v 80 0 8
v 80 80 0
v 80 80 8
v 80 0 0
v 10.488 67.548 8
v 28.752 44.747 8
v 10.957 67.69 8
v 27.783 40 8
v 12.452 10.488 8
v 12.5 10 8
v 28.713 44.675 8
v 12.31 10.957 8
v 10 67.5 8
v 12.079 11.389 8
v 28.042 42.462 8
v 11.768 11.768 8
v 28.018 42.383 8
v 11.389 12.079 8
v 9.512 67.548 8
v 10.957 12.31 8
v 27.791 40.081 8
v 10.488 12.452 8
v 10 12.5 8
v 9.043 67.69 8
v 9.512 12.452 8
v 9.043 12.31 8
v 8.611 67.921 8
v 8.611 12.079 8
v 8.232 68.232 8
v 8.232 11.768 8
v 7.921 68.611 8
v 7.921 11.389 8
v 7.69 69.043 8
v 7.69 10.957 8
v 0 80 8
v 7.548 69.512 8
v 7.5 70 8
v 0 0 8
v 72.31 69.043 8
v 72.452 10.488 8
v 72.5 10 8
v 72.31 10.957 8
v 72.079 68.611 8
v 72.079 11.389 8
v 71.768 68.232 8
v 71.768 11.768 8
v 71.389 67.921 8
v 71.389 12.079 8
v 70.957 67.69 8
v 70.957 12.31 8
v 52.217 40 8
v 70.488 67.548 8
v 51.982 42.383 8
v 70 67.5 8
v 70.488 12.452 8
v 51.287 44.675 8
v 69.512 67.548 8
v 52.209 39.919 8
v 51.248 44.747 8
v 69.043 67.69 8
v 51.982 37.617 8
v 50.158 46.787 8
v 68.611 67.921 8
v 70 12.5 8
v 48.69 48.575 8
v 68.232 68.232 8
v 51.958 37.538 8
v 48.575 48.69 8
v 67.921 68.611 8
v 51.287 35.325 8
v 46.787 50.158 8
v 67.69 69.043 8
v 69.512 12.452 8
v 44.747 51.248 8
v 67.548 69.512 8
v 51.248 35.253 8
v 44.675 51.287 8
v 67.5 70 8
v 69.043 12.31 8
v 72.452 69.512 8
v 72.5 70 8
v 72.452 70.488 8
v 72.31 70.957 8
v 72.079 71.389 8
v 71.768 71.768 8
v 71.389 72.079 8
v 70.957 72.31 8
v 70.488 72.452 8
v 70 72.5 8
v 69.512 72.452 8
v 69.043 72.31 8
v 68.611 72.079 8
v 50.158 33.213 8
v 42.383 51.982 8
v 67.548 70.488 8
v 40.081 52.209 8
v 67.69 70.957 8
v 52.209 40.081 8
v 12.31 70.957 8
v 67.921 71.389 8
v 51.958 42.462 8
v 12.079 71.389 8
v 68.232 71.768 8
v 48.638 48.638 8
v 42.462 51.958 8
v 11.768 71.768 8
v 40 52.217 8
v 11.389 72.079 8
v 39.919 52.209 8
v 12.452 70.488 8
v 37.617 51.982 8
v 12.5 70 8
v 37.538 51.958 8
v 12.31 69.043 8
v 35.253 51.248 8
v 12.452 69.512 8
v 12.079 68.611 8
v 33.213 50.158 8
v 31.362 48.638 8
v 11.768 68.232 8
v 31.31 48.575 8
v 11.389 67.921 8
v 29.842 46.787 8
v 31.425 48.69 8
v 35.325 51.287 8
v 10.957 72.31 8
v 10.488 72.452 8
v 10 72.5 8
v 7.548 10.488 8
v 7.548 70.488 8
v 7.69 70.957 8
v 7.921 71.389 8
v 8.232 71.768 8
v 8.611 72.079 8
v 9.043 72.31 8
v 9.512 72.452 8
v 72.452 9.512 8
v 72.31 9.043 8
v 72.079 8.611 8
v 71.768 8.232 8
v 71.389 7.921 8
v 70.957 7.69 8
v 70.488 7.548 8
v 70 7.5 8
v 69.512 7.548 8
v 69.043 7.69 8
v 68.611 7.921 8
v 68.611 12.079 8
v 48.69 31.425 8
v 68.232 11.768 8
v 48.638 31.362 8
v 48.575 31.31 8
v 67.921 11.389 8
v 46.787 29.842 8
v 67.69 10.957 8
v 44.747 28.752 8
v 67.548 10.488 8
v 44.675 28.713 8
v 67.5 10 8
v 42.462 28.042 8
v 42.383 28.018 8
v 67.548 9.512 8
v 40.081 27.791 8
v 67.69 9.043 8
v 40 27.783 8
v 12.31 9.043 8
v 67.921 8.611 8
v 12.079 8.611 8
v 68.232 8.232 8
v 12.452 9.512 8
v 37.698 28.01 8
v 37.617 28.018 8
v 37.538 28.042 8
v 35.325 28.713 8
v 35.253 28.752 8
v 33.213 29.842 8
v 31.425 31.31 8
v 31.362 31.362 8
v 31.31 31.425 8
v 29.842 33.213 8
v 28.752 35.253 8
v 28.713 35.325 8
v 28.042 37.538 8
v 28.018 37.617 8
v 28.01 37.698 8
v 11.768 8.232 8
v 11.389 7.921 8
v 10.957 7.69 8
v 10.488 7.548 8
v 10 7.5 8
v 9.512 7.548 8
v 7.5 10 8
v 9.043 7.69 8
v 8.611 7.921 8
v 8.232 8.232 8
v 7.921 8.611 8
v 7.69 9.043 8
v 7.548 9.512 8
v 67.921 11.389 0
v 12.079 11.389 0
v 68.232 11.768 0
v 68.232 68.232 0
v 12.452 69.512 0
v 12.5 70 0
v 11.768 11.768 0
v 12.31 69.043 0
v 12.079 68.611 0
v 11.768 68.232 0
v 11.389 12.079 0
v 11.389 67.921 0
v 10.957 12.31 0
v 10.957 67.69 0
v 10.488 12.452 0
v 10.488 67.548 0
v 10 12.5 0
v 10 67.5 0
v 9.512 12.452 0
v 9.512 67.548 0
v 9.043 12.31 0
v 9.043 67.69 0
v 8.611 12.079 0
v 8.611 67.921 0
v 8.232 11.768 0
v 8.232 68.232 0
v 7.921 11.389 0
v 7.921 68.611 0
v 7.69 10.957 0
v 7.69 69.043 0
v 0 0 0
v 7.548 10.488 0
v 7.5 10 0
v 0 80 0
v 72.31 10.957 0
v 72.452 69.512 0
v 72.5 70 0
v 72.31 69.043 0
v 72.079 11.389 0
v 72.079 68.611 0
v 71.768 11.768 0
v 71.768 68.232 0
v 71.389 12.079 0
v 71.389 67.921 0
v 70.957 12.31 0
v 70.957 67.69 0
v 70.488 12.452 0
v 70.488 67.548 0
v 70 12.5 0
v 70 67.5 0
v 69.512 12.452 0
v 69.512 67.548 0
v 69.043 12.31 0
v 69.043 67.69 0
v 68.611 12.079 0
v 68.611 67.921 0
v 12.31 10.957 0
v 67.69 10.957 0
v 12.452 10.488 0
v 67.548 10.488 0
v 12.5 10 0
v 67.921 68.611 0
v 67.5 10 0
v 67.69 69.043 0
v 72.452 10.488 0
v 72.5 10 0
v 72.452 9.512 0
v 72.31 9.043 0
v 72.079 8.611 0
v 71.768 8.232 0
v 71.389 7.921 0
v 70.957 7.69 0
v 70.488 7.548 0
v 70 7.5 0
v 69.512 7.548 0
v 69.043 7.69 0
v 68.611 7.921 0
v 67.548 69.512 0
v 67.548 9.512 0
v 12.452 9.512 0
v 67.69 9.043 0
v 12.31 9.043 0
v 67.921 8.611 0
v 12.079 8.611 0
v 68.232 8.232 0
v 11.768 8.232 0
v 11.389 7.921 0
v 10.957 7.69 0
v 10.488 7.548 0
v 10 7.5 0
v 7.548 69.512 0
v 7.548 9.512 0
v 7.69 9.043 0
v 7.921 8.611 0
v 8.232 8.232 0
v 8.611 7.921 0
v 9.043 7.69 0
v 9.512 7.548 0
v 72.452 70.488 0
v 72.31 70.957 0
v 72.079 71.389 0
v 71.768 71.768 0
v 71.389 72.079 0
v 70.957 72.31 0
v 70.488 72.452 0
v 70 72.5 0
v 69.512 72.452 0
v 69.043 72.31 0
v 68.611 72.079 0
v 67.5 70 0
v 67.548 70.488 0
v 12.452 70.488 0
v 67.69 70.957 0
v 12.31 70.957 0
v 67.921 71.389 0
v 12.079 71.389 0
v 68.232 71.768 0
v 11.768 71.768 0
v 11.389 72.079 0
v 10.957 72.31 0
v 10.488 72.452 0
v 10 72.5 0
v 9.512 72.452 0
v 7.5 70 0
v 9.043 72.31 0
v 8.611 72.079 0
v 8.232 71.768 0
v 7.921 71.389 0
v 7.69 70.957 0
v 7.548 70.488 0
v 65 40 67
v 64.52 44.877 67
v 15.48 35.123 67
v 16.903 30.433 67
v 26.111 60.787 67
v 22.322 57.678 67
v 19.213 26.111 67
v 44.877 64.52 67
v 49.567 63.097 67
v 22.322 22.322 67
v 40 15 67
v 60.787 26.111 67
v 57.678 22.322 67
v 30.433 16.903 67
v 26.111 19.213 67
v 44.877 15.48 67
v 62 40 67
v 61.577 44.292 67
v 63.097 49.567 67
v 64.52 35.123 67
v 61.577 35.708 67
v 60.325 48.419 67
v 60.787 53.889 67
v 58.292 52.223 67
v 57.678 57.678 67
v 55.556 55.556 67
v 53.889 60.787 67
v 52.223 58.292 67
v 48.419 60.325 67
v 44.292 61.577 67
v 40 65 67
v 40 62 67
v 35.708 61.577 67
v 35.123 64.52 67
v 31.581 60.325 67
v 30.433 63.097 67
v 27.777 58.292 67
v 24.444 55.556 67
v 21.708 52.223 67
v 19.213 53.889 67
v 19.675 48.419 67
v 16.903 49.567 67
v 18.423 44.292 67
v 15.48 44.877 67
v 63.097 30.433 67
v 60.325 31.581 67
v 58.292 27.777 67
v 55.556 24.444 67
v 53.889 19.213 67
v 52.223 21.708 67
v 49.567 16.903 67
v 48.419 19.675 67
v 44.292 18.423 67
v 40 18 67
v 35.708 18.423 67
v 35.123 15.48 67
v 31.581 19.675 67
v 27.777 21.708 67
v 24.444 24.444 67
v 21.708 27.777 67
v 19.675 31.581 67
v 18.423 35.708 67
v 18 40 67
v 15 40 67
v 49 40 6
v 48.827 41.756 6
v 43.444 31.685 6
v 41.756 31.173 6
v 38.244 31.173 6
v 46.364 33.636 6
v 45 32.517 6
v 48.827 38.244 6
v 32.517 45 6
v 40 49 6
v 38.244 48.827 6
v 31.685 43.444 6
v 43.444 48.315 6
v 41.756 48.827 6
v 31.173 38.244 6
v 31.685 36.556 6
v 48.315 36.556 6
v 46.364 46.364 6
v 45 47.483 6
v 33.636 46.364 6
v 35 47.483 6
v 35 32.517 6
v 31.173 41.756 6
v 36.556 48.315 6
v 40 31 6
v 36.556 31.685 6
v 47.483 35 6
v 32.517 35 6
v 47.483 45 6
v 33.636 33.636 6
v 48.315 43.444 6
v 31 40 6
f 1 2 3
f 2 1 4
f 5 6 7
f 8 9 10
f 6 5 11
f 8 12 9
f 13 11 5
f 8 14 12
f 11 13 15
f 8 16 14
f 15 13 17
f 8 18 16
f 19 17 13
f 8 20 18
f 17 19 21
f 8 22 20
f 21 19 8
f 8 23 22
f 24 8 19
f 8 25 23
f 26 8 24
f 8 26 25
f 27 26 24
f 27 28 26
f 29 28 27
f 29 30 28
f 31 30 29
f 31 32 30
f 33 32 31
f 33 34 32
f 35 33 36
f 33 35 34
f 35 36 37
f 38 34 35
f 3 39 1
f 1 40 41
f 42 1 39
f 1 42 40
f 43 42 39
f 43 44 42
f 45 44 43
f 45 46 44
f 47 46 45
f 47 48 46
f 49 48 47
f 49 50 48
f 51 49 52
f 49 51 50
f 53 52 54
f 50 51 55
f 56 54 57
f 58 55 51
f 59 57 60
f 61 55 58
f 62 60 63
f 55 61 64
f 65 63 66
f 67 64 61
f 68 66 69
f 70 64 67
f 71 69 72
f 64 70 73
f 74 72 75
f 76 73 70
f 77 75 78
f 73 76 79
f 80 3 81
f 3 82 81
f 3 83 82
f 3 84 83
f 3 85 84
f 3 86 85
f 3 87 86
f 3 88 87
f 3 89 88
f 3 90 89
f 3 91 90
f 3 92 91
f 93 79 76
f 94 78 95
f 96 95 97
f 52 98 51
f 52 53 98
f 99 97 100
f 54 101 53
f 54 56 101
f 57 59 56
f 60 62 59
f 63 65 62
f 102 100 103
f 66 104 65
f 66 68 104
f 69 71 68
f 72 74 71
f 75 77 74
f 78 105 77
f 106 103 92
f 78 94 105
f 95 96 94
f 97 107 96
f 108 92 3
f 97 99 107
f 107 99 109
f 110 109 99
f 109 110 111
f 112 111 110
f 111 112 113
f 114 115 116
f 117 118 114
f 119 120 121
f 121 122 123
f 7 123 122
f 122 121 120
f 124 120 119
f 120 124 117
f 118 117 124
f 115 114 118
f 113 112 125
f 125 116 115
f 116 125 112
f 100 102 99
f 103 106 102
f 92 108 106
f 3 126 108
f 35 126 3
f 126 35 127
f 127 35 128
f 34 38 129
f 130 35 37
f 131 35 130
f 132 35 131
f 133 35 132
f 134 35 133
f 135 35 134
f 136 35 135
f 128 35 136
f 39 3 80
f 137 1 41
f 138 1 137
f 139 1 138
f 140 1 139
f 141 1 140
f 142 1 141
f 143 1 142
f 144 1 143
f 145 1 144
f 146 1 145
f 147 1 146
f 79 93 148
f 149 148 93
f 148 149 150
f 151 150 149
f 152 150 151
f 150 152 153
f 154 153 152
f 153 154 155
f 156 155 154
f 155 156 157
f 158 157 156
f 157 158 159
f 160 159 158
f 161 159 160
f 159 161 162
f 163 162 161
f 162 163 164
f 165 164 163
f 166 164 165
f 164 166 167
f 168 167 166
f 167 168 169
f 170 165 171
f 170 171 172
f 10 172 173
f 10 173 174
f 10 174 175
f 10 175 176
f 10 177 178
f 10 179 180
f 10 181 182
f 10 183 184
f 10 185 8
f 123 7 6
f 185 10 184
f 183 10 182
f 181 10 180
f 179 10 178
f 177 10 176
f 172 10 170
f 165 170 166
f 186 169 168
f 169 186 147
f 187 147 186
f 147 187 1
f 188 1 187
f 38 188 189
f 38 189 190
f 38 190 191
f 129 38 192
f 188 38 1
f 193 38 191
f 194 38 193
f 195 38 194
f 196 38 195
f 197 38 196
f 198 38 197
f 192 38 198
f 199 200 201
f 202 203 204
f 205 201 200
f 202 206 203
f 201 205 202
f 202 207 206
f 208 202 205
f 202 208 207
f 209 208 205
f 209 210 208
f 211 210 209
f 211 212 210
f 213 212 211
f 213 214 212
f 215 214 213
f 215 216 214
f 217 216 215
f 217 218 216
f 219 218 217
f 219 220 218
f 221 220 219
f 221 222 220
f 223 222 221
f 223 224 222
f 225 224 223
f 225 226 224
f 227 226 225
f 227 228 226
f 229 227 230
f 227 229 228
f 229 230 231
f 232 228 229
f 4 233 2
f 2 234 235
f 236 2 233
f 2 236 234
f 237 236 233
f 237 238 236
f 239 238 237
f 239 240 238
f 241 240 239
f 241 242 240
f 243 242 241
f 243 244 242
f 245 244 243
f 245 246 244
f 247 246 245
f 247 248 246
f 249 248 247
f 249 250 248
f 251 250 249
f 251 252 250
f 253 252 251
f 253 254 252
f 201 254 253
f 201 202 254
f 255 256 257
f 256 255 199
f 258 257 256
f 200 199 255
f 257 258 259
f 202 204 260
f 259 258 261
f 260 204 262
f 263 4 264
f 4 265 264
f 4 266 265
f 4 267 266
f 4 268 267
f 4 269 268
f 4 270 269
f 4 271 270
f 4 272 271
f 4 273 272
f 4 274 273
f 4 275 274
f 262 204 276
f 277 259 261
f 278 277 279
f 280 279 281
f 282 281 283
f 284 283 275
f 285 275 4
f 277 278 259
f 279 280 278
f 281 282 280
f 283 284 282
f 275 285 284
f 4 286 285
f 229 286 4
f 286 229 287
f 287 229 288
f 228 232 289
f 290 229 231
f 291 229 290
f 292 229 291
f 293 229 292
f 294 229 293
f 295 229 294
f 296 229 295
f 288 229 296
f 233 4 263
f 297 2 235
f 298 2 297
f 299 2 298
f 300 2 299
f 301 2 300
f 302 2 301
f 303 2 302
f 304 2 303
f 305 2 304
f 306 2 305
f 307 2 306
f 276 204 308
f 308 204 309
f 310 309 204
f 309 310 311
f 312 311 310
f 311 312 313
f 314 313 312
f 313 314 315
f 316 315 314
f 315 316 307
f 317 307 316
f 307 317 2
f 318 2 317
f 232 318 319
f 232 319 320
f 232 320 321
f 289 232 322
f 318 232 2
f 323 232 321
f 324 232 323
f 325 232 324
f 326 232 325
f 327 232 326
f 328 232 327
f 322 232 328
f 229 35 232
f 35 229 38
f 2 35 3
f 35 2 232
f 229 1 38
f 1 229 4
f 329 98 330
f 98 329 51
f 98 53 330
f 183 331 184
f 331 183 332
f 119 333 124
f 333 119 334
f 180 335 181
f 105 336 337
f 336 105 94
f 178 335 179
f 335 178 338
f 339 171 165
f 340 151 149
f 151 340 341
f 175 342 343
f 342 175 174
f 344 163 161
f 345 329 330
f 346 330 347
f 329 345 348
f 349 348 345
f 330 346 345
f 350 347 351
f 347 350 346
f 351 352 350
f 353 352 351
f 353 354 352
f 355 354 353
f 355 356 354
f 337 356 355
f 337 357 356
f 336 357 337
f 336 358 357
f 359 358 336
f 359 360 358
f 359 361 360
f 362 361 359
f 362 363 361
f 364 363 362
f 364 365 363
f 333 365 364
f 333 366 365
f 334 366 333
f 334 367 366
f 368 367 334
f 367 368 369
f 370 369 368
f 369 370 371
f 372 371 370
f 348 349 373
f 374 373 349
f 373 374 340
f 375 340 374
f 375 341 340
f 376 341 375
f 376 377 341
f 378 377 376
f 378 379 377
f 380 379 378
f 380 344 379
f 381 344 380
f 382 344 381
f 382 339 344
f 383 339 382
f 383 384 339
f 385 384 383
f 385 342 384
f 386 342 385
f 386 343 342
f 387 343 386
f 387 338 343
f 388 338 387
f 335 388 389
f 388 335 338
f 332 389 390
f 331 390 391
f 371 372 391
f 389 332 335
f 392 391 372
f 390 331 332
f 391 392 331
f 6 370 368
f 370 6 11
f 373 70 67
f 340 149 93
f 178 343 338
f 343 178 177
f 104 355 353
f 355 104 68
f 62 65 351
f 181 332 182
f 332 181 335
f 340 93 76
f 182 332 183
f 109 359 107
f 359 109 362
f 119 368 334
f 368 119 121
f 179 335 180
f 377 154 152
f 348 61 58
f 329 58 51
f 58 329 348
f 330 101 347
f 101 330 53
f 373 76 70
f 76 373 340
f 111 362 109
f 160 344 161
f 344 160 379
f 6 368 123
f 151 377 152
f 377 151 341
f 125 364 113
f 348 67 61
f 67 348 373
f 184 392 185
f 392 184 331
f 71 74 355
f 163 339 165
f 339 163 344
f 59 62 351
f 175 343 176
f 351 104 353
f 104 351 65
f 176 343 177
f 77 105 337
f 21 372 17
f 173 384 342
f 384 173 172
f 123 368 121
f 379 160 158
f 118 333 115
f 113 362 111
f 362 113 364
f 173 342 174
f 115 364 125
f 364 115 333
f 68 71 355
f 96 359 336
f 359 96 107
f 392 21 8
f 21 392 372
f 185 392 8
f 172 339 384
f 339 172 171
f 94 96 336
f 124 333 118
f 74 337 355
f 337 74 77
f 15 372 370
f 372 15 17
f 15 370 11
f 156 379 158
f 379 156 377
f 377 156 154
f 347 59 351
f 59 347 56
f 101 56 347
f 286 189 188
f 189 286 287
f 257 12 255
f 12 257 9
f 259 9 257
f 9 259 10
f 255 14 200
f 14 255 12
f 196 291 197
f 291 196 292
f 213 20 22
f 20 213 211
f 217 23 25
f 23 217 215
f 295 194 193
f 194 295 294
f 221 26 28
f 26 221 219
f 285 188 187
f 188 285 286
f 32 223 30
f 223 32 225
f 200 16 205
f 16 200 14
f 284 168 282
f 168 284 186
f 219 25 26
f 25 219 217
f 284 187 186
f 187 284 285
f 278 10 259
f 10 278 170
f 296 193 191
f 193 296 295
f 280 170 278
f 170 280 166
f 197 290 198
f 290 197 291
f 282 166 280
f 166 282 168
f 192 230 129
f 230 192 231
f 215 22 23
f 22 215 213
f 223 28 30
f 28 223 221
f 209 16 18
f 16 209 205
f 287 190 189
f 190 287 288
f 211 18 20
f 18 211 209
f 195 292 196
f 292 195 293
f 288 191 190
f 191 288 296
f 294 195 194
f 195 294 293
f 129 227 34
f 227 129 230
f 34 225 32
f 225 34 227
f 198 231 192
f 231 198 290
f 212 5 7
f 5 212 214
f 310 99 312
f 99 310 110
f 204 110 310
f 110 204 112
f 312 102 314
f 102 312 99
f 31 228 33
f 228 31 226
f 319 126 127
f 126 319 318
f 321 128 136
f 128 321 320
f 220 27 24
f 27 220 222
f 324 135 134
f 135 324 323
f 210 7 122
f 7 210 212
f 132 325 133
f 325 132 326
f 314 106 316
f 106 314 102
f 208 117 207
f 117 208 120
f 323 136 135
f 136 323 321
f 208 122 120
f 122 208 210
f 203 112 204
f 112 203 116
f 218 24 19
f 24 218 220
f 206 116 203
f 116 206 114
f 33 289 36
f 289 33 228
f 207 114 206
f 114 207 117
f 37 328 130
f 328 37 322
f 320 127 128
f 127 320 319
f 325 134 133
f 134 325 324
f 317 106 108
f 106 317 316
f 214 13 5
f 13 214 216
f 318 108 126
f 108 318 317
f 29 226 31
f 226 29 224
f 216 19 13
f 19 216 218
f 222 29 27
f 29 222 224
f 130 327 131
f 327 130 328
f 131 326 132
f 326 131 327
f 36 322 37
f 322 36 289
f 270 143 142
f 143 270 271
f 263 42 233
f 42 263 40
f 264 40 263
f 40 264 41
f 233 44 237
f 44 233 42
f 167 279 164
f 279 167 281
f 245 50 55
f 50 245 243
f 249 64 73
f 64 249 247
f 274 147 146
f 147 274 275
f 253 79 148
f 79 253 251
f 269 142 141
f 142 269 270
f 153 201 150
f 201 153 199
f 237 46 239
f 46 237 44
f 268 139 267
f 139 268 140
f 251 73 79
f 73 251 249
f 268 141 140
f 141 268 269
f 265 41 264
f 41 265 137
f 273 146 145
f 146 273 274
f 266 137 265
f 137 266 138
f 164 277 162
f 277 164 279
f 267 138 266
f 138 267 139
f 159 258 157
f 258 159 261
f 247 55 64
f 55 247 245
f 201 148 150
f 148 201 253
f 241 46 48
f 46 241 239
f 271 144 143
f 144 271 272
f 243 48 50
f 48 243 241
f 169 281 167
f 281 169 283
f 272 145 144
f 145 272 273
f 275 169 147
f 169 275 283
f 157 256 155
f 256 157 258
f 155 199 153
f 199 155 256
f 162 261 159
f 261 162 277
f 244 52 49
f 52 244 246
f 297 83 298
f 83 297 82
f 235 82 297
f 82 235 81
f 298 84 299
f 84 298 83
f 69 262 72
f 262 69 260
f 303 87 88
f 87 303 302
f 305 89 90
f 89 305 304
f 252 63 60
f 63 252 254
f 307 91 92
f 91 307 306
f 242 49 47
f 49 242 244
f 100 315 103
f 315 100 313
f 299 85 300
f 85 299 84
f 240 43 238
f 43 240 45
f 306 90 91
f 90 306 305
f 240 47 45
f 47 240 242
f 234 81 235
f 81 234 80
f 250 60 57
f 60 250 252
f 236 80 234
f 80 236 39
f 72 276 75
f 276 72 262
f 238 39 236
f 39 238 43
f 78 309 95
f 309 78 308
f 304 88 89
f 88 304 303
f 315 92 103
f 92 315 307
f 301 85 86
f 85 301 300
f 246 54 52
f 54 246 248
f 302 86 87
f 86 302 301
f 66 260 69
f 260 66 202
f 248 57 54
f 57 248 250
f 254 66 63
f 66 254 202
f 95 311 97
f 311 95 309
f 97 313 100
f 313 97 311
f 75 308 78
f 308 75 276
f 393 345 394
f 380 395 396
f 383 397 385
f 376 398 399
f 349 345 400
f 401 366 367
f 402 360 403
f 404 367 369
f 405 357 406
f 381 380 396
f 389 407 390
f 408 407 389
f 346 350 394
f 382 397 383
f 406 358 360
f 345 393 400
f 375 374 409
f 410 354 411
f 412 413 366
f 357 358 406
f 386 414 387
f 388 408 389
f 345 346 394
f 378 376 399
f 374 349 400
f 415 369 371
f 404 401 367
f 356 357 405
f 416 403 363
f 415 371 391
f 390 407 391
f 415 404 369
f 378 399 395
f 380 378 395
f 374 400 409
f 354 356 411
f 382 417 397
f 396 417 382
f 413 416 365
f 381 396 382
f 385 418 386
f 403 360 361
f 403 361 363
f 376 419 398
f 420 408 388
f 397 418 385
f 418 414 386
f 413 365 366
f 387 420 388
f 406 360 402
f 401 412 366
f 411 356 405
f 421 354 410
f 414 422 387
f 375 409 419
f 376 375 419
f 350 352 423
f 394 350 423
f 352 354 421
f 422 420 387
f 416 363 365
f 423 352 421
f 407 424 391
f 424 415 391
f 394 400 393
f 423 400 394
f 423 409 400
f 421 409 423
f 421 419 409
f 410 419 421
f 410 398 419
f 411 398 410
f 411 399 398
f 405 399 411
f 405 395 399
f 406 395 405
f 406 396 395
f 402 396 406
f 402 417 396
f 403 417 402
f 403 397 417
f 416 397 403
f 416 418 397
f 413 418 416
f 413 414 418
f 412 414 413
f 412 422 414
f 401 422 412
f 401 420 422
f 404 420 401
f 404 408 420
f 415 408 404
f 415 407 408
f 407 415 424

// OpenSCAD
$fn = 32;

// ----------------------------------------------------------------------
// Hopper: flanged with square flange
// ----------------------------------------------------------------------

// --- parameters (mm) ---
fl = 80;                  // flange side, X and Y
fl_t = 8;                 // flange thickness
cone_h = 60;              // cone height above the flange
top_d = 50;               // cone mouth diameter
bot_d = 24;               // cone spout diameter
wall = 3;                 // cone wall thickness
hole_r = 2.5;             // flange hole radius
hole_in = 10;             // hole inset from the corners

bore_d = bot_d - 2 * wall;  // spout bore diameter
total_h = fl_t + cone_h - 1;  // overall height

difference() {
  union() {
    cube([fl, fl, fl_t]);
    translate([fl / 2, fl / 2, fl_t - 1])
      cylinder(h = cone_h, d1 = bot_d, d2 = top_d);
  }
  translate([fl / 2, fl / 2, fl_t - 2])
    cylinder(h = cone_h + 1, d1 = bore_d, d2 = top_d - 2 * wall);
  for (sx = [0, 1], sy = [0, 1])
    translate([sx ? fl - hole_in : hole_in,
               sy ? fl - hole_in : hole_in, -1])
      cylinder(r = hole_r, h = fl_t + 2);
}
